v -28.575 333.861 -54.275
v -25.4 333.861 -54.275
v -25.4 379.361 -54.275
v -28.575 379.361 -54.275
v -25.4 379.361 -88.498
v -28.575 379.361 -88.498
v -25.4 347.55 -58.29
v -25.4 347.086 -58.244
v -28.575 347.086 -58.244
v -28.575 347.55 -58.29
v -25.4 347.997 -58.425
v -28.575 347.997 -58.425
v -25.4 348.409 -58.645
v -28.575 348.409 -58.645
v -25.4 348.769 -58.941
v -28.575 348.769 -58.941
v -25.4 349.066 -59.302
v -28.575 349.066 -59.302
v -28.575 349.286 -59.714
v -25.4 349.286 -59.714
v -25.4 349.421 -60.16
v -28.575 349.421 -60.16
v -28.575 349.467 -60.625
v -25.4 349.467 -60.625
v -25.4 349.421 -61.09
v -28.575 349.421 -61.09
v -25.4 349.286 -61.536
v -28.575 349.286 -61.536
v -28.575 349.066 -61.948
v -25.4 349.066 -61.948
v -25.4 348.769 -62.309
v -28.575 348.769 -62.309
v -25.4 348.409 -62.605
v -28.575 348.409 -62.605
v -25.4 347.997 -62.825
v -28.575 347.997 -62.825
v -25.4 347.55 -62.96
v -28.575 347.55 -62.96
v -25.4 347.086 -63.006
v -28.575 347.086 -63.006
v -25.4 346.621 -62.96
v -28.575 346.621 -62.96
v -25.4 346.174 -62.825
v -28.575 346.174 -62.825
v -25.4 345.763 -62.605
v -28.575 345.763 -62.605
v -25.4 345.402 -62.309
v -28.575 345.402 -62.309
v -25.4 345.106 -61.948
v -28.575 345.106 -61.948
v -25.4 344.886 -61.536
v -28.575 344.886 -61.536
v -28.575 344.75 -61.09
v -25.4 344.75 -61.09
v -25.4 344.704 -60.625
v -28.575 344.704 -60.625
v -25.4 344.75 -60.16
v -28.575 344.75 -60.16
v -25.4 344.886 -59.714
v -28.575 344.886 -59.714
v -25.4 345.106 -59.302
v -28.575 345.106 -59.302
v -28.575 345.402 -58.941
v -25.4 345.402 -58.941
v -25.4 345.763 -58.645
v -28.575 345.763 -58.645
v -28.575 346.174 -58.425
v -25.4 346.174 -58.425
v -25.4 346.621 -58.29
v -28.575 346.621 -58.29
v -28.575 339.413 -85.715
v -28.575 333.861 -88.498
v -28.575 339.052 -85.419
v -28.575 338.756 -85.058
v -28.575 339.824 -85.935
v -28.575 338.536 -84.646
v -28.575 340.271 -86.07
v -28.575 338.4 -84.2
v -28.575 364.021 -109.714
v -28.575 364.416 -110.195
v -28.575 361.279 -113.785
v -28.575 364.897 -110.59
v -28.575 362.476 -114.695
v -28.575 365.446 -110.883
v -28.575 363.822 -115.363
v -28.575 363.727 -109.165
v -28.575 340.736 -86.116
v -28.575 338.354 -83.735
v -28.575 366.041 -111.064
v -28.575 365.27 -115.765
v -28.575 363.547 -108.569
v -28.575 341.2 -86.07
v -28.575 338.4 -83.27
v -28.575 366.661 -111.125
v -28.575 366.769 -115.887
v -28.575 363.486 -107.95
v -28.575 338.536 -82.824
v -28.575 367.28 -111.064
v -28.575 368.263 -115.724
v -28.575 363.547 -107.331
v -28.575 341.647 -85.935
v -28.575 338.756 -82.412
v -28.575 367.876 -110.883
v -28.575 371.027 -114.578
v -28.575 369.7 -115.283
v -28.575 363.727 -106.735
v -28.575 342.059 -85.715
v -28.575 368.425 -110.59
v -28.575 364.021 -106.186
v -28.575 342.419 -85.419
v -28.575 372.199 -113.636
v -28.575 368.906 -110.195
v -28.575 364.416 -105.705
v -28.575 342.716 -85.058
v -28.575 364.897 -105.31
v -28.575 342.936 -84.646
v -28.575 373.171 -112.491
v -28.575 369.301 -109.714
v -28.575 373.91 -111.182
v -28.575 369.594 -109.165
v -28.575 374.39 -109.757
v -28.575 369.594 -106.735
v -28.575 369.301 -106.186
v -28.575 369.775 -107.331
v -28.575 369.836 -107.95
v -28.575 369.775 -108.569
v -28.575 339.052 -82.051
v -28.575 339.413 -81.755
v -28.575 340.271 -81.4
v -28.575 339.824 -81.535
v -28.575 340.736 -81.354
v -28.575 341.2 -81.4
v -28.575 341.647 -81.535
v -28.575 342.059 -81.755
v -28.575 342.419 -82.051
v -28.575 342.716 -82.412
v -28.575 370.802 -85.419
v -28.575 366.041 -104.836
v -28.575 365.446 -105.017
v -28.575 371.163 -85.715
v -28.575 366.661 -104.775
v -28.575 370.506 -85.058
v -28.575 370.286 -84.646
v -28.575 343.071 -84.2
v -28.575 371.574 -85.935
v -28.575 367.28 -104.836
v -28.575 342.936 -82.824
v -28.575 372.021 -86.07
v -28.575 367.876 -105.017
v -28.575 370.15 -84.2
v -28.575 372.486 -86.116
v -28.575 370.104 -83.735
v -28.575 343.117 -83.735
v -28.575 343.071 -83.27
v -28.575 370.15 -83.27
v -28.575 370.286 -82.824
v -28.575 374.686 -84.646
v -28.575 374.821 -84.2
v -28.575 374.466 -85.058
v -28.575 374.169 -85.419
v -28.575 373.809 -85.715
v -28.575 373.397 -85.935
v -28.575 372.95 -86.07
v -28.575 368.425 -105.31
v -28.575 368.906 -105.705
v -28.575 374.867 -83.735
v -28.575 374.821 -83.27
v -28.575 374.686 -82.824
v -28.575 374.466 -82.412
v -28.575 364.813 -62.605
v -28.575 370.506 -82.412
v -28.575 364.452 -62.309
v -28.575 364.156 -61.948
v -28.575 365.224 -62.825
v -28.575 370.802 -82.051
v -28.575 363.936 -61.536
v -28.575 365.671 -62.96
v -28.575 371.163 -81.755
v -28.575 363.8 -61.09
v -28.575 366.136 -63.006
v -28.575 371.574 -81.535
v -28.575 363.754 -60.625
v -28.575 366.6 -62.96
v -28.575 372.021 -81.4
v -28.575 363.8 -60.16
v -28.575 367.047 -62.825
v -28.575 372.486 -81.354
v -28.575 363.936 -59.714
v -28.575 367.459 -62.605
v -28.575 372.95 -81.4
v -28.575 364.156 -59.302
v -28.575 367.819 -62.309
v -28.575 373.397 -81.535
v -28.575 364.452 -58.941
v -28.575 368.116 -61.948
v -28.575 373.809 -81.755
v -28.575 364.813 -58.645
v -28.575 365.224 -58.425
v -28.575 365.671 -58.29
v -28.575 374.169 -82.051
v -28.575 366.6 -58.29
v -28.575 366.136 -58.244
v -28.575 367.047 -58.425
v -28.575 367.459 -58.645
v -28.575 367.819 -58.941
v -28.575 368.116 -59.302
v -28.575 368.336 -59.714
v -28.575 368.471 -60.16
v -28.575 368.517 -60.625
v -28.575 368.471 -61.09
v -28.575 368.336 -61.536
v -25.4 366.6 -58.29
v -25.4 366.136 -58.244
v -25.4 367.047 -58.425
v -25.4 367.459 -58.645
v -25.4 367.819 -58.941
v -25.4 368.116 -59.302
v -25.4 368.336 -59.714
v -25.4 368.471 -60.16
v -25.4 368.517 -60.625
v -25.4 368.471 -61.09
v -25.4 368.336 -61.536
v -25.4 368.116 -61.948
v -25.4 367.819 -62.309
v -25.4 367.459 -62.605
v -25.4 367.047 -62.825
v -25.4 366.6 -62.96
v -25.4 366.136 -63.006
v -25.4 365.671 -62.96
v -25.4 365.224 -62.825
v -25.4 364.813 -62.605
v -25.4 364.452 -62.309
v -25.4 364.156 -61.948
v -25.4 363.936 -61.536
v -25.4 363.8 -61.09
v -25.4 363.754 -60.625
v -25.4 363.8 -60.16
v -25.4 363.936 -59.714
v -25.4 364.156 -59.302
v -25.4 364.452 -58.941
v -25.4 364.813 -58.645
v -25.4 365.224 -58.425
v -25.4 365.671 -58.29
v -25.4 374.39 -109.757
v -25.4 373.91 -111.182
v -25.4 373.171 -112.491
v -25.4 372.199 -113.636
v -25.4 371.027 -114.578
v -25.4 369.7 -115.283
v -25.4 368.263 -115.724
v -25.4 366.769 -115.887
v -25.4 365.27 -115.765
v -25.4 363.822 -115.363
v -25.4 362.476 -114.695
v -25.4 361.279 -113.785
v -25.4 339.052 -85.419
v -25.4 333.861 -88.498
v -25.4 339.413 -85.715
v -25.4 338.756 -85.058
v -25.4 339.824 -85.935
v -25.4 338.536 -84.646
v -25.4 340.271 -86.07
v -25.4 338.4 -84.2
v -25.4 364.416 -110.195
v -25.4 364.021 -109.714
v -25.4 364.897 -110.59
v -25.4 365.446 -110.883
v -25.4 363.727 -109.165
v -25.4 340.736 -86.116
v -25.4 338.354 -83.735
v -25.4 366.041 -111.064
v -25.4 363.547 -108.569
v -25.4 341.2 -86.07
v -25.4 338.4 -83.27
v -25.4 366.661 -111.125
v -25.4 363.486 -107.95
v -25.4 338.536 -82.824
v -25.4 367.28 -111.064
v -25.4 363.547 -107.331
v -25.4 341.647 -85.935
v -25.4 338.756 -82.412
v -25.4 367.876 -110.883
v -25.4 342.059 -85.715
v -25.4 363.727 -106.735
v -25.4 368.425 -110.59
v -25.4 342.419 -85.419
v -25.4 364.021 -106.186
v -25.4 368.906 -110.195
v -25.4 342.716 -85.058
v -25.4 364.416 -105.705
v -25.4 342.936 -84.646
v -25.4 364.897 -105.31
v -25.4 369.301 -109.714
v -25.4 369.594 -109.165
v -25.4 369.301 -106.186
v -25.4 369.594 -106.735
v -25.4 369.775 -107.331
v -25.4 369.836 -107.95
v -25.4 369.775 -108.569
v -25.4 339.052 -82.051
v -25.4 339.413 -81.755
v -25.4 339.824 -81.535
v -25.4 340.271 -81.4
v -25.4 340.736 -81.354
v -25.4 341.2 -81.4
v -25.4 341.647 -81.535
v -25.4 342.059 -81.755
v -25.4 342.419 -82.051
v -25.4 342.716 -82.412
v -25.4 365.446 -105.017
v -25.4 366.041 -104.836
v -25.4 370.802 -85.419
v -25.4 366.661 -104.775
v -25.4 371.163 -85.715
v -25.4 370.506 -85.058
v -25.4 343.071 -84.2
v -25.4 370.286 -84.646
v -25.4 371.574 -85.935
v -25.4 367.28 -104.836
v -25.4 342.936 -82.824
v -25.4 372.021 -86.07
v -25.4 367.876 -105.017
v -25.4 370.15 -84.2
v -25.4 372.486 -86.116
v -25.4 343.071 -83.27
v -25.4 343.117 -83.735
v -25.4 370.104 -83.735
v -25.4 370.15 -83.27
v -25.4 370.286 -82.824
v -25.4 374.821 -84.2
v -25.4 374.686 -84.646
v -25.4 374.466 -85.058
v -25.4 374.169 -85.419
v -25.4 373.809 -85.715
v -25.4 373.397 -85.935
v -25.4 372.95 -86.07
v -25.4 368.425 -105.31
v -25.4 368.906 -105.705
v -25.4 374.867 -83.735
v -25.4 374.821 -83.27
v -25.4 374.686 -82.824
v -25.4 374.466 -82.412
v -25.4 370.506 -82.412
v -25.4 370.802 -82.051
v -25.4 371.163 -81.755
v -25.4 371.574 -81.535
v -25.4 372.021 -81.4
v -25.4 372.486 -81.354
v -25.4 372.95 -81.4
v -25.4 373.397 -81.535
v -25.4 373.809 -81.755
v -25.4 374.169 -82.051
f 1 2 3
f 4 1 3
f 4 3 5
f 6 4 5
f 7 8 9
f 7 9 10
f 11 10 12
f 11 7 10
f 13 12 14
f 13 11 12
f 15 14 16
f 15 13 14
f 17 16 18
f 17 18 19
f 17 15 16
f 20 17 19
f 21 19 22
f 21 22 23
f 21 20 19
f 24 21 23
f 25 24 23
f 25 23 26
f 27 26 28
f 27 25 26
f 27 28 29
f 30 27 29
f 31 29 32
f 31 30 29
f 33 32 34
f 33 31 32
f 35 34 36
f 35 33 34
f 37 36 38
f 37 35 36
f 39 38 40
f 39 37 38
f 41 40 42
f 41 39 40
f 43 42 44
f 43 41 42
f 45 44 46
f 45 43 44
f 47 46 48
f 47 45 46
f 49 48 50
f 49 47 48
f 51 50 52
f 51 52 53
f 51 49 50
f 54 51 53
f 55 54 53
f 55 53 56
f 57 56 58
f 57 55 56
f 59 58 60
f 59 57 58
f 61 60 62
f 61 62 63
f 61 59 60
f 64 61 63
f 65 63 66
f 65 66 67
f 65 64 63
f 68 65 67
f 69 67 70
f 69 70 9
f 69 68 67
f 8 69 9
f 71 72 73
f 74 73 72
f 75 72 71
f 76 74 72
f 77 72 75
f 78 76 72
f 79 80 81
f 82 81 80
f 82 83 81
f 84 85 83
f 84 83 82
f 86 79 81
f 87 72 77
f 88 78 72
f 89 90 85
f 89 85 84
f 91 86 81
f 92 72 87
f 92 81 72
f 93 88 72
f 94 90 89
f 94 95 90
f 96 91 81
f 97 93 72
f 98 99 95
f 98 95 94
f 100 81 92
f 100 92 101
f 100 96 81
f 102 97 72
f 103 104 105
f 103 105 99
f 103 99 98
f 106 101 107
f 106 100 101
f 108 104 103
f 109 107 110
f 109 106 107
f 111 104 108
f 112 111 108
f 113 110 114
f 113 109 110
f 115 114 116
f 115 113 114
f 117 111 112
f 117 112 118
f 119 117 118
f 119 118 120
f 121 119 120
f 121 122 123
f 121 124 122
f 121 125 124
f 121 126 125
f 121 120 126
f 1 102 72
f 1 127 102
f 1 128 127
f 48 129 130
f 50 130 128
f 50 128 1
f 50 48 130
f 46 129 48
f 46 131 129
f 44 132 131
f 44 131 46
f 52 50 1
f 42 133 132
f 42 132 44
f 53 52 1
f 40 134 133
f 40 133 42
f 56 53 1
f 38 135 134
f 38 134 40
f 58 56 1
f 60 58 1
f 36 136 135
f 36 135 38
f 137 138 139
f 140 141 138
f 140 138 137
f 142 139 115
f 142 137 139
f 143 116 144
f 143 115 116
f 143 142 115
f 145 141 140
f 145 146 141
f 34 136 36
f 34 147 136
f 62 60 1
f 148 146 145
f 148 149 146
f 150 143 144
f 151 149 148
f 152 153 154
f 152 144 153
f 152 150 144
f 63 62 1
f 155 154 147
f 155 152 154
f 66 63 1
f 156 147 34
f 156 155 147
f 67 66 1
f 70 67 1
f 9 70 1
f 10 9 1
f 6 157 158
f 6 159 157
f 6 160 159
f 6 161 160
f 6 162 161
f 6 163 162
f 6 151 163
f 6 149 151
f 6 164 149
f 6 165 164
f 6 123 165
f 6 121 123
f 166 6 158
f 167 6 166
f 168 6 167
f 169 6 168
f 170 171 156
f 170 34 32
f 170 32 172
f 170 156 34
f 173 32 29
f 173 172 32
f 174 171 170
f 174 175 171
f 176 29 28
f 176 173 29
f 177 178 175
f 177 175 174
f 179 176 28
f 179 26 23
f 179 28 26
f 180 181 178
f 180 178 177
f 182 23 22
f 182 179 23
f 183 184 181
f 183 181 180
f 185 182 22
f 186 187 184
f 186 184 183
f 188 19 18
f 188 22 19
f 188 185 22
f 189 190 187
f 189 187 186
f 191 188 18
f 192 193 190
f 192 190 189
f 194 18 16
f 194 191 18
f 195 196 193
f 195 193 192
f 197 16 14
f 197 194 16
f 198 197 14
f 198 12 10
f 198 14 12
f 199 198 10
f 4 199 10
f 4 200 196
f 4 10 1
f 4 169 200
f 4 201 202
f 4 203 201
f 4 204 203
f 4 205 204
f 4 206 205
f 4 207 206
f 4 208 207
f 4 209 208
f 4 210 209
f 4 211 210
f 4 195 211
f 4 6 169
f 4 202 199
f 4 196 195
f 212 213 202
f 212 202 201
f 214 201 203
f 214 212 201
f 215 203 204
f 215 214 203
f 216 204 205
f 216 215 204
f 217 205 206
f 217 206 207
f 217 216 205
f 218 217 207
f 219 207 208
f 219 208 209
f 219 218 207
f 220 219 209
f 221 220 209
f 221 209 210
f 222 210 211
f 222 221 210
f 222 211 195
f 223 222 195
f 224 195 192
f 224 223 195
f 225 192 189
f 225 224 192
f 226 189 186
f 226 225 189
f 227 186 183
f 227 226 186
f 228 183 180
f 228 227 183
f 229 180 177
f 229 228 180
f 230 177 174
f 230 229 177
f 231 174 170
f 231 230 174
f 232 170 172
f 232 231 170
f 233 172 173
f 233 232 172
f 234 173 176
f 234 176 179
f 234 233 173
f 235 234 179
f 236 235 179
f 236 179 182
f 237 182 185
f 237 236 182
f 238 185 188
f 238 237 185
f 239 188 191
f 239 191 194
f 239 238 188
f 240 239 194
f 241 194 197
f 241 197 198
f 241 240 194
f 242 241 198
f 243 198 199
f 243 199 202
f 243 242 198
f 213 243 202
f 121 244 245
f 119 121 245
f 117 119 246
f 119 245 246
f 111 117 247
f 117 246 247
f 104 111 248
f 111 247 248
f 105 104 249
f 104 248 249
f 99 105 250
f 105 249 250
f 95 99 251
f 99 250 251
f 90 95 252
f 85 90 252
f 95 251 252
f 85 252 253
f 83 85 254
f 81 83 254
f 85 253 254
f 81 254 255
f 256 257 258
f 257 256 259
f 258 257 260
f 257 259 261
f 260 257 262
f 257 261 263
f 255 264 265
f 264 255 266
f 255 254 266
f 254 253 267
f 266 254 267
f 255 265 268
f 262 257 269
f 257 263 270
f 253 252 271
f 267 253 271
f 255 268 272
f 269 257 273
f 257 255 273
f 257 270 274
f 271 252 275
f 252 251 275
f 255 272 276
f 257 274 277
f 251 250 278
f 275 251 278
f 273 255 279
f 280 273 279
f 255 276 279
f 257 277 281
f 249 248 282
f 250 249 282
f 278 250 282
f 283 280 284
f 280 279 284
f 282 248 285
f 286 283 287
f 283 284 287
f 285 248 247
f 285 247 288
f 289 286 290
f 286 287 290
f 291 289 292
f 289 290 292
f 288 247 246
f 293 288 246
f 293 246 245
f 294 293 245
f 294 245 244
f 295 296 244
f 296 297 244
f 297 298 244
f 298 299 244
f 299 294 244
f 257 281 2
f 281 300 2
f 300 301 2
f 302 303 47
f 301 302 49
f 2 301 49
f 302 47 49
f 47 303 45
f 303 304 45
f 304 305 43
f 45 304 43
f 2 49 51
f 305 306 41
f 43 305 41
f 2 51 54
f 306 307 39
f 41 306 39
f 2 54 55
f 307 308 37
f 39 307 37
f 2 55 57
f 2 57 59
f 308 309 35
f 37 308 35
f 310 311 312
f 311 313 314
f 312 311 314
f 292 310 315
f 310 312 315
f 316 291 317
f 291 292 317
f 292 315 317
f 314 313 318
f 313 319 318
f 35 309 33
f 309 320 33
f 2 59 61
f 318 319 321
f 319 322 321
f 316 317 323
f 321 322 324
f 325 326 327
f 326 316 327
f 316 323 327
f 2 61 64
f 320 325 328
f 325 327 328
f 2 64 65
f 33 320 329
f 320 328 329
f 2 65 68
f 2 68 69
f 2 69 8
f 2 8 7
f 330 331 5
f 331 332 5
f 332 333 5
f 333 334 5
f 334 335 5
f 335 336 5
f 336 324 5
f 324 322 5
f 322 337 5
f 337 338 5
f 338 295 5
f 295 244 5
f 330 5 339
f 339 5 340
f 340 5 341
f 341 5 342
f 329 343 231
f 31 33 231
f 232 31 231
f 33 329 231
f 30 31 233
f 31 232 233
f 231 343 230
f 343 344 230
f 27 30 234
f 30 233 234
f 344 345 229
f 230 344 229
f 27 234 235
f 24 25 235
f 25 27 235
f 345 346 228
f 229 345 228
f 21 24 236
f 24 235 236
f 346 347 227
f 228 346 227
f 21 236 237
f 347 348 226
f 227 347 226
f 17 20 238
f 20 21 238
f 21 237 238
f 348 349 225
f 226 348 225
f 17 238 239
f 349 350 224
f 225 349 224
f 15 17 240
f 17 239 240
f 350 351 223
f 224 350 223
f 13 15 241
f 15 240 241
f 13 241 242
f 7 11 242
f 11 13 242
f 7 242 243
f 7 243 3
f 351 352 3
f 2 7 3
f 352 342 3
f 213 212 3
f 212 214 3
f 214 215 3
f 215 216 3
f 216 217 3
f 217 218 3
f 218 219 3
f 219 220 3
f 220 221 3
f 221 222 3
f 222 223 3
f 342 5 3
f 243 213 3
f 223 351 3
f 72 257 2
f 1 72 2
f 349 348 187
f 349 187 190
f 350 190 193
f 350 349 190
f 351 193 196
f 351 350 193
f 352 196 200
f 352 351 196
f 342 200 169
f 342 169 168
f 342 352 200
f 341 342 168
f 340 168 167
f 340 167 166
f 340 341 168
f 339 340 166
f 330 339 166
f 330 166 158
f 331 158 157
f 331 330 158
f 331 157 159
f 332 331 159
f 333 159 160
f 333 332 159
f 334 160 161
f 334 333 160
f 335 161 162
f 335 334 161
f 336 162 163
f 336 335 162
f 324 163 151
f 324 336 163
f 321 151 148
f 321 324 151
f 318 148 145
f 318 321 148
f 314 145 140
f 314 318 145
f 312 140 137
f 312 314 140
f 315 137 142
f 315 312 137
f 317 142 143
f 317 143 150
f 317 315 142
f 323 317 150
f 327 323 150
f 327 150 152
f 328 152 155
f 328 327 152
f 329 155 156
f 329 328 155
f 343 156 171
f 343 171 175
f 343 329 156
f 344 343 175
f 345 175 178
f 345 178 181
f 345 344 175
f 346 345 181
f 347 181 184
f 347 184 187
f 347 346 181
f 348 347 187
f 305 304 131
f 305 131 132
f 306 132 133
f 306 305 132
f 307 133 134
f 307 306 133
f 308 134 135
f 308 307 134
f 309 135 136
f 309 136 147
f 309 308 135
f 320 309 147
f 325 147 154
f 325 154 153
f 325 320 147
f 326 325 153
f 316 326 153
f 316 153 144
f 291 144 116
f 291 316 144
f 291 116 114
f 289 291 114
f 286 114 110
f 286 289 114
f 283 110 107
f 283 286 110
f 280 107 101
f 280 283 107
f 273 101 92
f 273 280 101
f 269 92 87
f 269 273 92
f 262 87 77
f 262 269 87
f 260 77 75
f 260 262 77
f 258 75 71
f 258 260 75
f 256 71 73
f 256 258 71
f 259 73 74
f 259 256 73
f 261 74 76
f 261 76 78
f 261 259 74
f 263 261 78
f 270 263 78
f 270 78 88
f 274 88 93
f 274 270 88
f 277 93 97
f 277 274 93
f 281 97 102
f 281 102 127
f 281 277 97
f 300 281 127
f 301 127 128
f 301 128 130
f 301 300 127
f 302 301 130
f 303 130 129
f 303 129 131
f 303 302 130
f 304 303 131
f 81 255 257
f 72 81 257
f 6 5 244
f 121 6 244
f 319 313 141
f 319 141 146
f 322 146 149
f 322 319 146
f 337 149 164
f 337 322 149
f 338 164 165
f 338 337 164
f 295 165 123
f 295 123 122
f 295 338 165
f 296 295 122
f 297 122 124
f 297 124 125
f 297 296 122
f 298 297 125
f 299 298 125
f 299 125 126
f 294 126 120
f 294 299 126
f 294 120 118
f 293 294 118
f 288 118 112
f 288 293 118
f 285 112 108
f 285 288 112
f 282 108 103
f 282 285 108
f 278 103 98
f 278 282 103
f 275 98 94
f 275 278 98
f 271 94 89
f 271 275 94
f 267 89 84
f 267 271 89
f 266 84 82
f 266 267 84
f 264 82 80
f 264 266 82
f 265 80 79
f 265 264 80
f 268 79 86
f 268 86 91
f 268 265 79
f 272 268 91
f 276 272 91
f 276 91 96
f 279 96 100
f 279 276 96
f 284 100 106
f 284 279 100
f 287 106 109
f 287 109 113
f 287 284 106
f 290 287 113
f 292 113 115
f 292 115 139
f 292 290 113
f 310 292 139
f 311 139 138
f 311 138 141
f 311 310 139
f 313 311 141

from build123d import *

# Parameters (mm, degrees)
SKETCH1_R           = 2.38125
SKETCH1_R_2         = 3.175
BOSS_EXTRUDE1_DEPTH = 3.175


with BuildPart() as part:
    # Sketch1 → Boss-Extrude1 (new body)
    with BuildSketch(Plane.ZY.offset(25.4)):
        with BuildLine():
            Line((-54.275, 379.360683619), (-88.4975, 379.360683619))
            Line((-88.4975, 379.360683619), (-109.757210754, 374.389713024))
            ThreePointArc((-109.757210754, 374.389713024), (-115.537519793, 368.991659734), (-113.784858038, 361.279388429))
            Line((-113.784858038, 361.279388429), (-88.4975, 333.860683619))
            Line((-88.4975, 333.860683619), (-54.275, 333.860683619))
            Line((-54.275, 333.860683619), (-54.275, 379.360683619))
        make_face()
        with Locations((-83.735, 372.485683619)):
            Circle(SKETCH1_R, mode=Mode.SUBTRACT)
        with Locations((-83.735, 340.735683619)):
            Circle(SKETCH1_R, mode=Mode.SUBTRACT)
        with Locations((-60.625, 366.135683619)):
            Circle(SKETCH1_R, mode=Mode.SUBTRACT)
        with Locations((-60.625, 347.085683619)):
            Circle(SKETCH1_R, mode=Mode.SUBTRACT)
        with Locations((-107.95, 366.660683619)):
            Circle(SKETCH1_R_2, mode=Mode.SUBTRACT)
    extrude(amount=BOSS_EXTRUDE1_DEPTH)


solid = part.part
